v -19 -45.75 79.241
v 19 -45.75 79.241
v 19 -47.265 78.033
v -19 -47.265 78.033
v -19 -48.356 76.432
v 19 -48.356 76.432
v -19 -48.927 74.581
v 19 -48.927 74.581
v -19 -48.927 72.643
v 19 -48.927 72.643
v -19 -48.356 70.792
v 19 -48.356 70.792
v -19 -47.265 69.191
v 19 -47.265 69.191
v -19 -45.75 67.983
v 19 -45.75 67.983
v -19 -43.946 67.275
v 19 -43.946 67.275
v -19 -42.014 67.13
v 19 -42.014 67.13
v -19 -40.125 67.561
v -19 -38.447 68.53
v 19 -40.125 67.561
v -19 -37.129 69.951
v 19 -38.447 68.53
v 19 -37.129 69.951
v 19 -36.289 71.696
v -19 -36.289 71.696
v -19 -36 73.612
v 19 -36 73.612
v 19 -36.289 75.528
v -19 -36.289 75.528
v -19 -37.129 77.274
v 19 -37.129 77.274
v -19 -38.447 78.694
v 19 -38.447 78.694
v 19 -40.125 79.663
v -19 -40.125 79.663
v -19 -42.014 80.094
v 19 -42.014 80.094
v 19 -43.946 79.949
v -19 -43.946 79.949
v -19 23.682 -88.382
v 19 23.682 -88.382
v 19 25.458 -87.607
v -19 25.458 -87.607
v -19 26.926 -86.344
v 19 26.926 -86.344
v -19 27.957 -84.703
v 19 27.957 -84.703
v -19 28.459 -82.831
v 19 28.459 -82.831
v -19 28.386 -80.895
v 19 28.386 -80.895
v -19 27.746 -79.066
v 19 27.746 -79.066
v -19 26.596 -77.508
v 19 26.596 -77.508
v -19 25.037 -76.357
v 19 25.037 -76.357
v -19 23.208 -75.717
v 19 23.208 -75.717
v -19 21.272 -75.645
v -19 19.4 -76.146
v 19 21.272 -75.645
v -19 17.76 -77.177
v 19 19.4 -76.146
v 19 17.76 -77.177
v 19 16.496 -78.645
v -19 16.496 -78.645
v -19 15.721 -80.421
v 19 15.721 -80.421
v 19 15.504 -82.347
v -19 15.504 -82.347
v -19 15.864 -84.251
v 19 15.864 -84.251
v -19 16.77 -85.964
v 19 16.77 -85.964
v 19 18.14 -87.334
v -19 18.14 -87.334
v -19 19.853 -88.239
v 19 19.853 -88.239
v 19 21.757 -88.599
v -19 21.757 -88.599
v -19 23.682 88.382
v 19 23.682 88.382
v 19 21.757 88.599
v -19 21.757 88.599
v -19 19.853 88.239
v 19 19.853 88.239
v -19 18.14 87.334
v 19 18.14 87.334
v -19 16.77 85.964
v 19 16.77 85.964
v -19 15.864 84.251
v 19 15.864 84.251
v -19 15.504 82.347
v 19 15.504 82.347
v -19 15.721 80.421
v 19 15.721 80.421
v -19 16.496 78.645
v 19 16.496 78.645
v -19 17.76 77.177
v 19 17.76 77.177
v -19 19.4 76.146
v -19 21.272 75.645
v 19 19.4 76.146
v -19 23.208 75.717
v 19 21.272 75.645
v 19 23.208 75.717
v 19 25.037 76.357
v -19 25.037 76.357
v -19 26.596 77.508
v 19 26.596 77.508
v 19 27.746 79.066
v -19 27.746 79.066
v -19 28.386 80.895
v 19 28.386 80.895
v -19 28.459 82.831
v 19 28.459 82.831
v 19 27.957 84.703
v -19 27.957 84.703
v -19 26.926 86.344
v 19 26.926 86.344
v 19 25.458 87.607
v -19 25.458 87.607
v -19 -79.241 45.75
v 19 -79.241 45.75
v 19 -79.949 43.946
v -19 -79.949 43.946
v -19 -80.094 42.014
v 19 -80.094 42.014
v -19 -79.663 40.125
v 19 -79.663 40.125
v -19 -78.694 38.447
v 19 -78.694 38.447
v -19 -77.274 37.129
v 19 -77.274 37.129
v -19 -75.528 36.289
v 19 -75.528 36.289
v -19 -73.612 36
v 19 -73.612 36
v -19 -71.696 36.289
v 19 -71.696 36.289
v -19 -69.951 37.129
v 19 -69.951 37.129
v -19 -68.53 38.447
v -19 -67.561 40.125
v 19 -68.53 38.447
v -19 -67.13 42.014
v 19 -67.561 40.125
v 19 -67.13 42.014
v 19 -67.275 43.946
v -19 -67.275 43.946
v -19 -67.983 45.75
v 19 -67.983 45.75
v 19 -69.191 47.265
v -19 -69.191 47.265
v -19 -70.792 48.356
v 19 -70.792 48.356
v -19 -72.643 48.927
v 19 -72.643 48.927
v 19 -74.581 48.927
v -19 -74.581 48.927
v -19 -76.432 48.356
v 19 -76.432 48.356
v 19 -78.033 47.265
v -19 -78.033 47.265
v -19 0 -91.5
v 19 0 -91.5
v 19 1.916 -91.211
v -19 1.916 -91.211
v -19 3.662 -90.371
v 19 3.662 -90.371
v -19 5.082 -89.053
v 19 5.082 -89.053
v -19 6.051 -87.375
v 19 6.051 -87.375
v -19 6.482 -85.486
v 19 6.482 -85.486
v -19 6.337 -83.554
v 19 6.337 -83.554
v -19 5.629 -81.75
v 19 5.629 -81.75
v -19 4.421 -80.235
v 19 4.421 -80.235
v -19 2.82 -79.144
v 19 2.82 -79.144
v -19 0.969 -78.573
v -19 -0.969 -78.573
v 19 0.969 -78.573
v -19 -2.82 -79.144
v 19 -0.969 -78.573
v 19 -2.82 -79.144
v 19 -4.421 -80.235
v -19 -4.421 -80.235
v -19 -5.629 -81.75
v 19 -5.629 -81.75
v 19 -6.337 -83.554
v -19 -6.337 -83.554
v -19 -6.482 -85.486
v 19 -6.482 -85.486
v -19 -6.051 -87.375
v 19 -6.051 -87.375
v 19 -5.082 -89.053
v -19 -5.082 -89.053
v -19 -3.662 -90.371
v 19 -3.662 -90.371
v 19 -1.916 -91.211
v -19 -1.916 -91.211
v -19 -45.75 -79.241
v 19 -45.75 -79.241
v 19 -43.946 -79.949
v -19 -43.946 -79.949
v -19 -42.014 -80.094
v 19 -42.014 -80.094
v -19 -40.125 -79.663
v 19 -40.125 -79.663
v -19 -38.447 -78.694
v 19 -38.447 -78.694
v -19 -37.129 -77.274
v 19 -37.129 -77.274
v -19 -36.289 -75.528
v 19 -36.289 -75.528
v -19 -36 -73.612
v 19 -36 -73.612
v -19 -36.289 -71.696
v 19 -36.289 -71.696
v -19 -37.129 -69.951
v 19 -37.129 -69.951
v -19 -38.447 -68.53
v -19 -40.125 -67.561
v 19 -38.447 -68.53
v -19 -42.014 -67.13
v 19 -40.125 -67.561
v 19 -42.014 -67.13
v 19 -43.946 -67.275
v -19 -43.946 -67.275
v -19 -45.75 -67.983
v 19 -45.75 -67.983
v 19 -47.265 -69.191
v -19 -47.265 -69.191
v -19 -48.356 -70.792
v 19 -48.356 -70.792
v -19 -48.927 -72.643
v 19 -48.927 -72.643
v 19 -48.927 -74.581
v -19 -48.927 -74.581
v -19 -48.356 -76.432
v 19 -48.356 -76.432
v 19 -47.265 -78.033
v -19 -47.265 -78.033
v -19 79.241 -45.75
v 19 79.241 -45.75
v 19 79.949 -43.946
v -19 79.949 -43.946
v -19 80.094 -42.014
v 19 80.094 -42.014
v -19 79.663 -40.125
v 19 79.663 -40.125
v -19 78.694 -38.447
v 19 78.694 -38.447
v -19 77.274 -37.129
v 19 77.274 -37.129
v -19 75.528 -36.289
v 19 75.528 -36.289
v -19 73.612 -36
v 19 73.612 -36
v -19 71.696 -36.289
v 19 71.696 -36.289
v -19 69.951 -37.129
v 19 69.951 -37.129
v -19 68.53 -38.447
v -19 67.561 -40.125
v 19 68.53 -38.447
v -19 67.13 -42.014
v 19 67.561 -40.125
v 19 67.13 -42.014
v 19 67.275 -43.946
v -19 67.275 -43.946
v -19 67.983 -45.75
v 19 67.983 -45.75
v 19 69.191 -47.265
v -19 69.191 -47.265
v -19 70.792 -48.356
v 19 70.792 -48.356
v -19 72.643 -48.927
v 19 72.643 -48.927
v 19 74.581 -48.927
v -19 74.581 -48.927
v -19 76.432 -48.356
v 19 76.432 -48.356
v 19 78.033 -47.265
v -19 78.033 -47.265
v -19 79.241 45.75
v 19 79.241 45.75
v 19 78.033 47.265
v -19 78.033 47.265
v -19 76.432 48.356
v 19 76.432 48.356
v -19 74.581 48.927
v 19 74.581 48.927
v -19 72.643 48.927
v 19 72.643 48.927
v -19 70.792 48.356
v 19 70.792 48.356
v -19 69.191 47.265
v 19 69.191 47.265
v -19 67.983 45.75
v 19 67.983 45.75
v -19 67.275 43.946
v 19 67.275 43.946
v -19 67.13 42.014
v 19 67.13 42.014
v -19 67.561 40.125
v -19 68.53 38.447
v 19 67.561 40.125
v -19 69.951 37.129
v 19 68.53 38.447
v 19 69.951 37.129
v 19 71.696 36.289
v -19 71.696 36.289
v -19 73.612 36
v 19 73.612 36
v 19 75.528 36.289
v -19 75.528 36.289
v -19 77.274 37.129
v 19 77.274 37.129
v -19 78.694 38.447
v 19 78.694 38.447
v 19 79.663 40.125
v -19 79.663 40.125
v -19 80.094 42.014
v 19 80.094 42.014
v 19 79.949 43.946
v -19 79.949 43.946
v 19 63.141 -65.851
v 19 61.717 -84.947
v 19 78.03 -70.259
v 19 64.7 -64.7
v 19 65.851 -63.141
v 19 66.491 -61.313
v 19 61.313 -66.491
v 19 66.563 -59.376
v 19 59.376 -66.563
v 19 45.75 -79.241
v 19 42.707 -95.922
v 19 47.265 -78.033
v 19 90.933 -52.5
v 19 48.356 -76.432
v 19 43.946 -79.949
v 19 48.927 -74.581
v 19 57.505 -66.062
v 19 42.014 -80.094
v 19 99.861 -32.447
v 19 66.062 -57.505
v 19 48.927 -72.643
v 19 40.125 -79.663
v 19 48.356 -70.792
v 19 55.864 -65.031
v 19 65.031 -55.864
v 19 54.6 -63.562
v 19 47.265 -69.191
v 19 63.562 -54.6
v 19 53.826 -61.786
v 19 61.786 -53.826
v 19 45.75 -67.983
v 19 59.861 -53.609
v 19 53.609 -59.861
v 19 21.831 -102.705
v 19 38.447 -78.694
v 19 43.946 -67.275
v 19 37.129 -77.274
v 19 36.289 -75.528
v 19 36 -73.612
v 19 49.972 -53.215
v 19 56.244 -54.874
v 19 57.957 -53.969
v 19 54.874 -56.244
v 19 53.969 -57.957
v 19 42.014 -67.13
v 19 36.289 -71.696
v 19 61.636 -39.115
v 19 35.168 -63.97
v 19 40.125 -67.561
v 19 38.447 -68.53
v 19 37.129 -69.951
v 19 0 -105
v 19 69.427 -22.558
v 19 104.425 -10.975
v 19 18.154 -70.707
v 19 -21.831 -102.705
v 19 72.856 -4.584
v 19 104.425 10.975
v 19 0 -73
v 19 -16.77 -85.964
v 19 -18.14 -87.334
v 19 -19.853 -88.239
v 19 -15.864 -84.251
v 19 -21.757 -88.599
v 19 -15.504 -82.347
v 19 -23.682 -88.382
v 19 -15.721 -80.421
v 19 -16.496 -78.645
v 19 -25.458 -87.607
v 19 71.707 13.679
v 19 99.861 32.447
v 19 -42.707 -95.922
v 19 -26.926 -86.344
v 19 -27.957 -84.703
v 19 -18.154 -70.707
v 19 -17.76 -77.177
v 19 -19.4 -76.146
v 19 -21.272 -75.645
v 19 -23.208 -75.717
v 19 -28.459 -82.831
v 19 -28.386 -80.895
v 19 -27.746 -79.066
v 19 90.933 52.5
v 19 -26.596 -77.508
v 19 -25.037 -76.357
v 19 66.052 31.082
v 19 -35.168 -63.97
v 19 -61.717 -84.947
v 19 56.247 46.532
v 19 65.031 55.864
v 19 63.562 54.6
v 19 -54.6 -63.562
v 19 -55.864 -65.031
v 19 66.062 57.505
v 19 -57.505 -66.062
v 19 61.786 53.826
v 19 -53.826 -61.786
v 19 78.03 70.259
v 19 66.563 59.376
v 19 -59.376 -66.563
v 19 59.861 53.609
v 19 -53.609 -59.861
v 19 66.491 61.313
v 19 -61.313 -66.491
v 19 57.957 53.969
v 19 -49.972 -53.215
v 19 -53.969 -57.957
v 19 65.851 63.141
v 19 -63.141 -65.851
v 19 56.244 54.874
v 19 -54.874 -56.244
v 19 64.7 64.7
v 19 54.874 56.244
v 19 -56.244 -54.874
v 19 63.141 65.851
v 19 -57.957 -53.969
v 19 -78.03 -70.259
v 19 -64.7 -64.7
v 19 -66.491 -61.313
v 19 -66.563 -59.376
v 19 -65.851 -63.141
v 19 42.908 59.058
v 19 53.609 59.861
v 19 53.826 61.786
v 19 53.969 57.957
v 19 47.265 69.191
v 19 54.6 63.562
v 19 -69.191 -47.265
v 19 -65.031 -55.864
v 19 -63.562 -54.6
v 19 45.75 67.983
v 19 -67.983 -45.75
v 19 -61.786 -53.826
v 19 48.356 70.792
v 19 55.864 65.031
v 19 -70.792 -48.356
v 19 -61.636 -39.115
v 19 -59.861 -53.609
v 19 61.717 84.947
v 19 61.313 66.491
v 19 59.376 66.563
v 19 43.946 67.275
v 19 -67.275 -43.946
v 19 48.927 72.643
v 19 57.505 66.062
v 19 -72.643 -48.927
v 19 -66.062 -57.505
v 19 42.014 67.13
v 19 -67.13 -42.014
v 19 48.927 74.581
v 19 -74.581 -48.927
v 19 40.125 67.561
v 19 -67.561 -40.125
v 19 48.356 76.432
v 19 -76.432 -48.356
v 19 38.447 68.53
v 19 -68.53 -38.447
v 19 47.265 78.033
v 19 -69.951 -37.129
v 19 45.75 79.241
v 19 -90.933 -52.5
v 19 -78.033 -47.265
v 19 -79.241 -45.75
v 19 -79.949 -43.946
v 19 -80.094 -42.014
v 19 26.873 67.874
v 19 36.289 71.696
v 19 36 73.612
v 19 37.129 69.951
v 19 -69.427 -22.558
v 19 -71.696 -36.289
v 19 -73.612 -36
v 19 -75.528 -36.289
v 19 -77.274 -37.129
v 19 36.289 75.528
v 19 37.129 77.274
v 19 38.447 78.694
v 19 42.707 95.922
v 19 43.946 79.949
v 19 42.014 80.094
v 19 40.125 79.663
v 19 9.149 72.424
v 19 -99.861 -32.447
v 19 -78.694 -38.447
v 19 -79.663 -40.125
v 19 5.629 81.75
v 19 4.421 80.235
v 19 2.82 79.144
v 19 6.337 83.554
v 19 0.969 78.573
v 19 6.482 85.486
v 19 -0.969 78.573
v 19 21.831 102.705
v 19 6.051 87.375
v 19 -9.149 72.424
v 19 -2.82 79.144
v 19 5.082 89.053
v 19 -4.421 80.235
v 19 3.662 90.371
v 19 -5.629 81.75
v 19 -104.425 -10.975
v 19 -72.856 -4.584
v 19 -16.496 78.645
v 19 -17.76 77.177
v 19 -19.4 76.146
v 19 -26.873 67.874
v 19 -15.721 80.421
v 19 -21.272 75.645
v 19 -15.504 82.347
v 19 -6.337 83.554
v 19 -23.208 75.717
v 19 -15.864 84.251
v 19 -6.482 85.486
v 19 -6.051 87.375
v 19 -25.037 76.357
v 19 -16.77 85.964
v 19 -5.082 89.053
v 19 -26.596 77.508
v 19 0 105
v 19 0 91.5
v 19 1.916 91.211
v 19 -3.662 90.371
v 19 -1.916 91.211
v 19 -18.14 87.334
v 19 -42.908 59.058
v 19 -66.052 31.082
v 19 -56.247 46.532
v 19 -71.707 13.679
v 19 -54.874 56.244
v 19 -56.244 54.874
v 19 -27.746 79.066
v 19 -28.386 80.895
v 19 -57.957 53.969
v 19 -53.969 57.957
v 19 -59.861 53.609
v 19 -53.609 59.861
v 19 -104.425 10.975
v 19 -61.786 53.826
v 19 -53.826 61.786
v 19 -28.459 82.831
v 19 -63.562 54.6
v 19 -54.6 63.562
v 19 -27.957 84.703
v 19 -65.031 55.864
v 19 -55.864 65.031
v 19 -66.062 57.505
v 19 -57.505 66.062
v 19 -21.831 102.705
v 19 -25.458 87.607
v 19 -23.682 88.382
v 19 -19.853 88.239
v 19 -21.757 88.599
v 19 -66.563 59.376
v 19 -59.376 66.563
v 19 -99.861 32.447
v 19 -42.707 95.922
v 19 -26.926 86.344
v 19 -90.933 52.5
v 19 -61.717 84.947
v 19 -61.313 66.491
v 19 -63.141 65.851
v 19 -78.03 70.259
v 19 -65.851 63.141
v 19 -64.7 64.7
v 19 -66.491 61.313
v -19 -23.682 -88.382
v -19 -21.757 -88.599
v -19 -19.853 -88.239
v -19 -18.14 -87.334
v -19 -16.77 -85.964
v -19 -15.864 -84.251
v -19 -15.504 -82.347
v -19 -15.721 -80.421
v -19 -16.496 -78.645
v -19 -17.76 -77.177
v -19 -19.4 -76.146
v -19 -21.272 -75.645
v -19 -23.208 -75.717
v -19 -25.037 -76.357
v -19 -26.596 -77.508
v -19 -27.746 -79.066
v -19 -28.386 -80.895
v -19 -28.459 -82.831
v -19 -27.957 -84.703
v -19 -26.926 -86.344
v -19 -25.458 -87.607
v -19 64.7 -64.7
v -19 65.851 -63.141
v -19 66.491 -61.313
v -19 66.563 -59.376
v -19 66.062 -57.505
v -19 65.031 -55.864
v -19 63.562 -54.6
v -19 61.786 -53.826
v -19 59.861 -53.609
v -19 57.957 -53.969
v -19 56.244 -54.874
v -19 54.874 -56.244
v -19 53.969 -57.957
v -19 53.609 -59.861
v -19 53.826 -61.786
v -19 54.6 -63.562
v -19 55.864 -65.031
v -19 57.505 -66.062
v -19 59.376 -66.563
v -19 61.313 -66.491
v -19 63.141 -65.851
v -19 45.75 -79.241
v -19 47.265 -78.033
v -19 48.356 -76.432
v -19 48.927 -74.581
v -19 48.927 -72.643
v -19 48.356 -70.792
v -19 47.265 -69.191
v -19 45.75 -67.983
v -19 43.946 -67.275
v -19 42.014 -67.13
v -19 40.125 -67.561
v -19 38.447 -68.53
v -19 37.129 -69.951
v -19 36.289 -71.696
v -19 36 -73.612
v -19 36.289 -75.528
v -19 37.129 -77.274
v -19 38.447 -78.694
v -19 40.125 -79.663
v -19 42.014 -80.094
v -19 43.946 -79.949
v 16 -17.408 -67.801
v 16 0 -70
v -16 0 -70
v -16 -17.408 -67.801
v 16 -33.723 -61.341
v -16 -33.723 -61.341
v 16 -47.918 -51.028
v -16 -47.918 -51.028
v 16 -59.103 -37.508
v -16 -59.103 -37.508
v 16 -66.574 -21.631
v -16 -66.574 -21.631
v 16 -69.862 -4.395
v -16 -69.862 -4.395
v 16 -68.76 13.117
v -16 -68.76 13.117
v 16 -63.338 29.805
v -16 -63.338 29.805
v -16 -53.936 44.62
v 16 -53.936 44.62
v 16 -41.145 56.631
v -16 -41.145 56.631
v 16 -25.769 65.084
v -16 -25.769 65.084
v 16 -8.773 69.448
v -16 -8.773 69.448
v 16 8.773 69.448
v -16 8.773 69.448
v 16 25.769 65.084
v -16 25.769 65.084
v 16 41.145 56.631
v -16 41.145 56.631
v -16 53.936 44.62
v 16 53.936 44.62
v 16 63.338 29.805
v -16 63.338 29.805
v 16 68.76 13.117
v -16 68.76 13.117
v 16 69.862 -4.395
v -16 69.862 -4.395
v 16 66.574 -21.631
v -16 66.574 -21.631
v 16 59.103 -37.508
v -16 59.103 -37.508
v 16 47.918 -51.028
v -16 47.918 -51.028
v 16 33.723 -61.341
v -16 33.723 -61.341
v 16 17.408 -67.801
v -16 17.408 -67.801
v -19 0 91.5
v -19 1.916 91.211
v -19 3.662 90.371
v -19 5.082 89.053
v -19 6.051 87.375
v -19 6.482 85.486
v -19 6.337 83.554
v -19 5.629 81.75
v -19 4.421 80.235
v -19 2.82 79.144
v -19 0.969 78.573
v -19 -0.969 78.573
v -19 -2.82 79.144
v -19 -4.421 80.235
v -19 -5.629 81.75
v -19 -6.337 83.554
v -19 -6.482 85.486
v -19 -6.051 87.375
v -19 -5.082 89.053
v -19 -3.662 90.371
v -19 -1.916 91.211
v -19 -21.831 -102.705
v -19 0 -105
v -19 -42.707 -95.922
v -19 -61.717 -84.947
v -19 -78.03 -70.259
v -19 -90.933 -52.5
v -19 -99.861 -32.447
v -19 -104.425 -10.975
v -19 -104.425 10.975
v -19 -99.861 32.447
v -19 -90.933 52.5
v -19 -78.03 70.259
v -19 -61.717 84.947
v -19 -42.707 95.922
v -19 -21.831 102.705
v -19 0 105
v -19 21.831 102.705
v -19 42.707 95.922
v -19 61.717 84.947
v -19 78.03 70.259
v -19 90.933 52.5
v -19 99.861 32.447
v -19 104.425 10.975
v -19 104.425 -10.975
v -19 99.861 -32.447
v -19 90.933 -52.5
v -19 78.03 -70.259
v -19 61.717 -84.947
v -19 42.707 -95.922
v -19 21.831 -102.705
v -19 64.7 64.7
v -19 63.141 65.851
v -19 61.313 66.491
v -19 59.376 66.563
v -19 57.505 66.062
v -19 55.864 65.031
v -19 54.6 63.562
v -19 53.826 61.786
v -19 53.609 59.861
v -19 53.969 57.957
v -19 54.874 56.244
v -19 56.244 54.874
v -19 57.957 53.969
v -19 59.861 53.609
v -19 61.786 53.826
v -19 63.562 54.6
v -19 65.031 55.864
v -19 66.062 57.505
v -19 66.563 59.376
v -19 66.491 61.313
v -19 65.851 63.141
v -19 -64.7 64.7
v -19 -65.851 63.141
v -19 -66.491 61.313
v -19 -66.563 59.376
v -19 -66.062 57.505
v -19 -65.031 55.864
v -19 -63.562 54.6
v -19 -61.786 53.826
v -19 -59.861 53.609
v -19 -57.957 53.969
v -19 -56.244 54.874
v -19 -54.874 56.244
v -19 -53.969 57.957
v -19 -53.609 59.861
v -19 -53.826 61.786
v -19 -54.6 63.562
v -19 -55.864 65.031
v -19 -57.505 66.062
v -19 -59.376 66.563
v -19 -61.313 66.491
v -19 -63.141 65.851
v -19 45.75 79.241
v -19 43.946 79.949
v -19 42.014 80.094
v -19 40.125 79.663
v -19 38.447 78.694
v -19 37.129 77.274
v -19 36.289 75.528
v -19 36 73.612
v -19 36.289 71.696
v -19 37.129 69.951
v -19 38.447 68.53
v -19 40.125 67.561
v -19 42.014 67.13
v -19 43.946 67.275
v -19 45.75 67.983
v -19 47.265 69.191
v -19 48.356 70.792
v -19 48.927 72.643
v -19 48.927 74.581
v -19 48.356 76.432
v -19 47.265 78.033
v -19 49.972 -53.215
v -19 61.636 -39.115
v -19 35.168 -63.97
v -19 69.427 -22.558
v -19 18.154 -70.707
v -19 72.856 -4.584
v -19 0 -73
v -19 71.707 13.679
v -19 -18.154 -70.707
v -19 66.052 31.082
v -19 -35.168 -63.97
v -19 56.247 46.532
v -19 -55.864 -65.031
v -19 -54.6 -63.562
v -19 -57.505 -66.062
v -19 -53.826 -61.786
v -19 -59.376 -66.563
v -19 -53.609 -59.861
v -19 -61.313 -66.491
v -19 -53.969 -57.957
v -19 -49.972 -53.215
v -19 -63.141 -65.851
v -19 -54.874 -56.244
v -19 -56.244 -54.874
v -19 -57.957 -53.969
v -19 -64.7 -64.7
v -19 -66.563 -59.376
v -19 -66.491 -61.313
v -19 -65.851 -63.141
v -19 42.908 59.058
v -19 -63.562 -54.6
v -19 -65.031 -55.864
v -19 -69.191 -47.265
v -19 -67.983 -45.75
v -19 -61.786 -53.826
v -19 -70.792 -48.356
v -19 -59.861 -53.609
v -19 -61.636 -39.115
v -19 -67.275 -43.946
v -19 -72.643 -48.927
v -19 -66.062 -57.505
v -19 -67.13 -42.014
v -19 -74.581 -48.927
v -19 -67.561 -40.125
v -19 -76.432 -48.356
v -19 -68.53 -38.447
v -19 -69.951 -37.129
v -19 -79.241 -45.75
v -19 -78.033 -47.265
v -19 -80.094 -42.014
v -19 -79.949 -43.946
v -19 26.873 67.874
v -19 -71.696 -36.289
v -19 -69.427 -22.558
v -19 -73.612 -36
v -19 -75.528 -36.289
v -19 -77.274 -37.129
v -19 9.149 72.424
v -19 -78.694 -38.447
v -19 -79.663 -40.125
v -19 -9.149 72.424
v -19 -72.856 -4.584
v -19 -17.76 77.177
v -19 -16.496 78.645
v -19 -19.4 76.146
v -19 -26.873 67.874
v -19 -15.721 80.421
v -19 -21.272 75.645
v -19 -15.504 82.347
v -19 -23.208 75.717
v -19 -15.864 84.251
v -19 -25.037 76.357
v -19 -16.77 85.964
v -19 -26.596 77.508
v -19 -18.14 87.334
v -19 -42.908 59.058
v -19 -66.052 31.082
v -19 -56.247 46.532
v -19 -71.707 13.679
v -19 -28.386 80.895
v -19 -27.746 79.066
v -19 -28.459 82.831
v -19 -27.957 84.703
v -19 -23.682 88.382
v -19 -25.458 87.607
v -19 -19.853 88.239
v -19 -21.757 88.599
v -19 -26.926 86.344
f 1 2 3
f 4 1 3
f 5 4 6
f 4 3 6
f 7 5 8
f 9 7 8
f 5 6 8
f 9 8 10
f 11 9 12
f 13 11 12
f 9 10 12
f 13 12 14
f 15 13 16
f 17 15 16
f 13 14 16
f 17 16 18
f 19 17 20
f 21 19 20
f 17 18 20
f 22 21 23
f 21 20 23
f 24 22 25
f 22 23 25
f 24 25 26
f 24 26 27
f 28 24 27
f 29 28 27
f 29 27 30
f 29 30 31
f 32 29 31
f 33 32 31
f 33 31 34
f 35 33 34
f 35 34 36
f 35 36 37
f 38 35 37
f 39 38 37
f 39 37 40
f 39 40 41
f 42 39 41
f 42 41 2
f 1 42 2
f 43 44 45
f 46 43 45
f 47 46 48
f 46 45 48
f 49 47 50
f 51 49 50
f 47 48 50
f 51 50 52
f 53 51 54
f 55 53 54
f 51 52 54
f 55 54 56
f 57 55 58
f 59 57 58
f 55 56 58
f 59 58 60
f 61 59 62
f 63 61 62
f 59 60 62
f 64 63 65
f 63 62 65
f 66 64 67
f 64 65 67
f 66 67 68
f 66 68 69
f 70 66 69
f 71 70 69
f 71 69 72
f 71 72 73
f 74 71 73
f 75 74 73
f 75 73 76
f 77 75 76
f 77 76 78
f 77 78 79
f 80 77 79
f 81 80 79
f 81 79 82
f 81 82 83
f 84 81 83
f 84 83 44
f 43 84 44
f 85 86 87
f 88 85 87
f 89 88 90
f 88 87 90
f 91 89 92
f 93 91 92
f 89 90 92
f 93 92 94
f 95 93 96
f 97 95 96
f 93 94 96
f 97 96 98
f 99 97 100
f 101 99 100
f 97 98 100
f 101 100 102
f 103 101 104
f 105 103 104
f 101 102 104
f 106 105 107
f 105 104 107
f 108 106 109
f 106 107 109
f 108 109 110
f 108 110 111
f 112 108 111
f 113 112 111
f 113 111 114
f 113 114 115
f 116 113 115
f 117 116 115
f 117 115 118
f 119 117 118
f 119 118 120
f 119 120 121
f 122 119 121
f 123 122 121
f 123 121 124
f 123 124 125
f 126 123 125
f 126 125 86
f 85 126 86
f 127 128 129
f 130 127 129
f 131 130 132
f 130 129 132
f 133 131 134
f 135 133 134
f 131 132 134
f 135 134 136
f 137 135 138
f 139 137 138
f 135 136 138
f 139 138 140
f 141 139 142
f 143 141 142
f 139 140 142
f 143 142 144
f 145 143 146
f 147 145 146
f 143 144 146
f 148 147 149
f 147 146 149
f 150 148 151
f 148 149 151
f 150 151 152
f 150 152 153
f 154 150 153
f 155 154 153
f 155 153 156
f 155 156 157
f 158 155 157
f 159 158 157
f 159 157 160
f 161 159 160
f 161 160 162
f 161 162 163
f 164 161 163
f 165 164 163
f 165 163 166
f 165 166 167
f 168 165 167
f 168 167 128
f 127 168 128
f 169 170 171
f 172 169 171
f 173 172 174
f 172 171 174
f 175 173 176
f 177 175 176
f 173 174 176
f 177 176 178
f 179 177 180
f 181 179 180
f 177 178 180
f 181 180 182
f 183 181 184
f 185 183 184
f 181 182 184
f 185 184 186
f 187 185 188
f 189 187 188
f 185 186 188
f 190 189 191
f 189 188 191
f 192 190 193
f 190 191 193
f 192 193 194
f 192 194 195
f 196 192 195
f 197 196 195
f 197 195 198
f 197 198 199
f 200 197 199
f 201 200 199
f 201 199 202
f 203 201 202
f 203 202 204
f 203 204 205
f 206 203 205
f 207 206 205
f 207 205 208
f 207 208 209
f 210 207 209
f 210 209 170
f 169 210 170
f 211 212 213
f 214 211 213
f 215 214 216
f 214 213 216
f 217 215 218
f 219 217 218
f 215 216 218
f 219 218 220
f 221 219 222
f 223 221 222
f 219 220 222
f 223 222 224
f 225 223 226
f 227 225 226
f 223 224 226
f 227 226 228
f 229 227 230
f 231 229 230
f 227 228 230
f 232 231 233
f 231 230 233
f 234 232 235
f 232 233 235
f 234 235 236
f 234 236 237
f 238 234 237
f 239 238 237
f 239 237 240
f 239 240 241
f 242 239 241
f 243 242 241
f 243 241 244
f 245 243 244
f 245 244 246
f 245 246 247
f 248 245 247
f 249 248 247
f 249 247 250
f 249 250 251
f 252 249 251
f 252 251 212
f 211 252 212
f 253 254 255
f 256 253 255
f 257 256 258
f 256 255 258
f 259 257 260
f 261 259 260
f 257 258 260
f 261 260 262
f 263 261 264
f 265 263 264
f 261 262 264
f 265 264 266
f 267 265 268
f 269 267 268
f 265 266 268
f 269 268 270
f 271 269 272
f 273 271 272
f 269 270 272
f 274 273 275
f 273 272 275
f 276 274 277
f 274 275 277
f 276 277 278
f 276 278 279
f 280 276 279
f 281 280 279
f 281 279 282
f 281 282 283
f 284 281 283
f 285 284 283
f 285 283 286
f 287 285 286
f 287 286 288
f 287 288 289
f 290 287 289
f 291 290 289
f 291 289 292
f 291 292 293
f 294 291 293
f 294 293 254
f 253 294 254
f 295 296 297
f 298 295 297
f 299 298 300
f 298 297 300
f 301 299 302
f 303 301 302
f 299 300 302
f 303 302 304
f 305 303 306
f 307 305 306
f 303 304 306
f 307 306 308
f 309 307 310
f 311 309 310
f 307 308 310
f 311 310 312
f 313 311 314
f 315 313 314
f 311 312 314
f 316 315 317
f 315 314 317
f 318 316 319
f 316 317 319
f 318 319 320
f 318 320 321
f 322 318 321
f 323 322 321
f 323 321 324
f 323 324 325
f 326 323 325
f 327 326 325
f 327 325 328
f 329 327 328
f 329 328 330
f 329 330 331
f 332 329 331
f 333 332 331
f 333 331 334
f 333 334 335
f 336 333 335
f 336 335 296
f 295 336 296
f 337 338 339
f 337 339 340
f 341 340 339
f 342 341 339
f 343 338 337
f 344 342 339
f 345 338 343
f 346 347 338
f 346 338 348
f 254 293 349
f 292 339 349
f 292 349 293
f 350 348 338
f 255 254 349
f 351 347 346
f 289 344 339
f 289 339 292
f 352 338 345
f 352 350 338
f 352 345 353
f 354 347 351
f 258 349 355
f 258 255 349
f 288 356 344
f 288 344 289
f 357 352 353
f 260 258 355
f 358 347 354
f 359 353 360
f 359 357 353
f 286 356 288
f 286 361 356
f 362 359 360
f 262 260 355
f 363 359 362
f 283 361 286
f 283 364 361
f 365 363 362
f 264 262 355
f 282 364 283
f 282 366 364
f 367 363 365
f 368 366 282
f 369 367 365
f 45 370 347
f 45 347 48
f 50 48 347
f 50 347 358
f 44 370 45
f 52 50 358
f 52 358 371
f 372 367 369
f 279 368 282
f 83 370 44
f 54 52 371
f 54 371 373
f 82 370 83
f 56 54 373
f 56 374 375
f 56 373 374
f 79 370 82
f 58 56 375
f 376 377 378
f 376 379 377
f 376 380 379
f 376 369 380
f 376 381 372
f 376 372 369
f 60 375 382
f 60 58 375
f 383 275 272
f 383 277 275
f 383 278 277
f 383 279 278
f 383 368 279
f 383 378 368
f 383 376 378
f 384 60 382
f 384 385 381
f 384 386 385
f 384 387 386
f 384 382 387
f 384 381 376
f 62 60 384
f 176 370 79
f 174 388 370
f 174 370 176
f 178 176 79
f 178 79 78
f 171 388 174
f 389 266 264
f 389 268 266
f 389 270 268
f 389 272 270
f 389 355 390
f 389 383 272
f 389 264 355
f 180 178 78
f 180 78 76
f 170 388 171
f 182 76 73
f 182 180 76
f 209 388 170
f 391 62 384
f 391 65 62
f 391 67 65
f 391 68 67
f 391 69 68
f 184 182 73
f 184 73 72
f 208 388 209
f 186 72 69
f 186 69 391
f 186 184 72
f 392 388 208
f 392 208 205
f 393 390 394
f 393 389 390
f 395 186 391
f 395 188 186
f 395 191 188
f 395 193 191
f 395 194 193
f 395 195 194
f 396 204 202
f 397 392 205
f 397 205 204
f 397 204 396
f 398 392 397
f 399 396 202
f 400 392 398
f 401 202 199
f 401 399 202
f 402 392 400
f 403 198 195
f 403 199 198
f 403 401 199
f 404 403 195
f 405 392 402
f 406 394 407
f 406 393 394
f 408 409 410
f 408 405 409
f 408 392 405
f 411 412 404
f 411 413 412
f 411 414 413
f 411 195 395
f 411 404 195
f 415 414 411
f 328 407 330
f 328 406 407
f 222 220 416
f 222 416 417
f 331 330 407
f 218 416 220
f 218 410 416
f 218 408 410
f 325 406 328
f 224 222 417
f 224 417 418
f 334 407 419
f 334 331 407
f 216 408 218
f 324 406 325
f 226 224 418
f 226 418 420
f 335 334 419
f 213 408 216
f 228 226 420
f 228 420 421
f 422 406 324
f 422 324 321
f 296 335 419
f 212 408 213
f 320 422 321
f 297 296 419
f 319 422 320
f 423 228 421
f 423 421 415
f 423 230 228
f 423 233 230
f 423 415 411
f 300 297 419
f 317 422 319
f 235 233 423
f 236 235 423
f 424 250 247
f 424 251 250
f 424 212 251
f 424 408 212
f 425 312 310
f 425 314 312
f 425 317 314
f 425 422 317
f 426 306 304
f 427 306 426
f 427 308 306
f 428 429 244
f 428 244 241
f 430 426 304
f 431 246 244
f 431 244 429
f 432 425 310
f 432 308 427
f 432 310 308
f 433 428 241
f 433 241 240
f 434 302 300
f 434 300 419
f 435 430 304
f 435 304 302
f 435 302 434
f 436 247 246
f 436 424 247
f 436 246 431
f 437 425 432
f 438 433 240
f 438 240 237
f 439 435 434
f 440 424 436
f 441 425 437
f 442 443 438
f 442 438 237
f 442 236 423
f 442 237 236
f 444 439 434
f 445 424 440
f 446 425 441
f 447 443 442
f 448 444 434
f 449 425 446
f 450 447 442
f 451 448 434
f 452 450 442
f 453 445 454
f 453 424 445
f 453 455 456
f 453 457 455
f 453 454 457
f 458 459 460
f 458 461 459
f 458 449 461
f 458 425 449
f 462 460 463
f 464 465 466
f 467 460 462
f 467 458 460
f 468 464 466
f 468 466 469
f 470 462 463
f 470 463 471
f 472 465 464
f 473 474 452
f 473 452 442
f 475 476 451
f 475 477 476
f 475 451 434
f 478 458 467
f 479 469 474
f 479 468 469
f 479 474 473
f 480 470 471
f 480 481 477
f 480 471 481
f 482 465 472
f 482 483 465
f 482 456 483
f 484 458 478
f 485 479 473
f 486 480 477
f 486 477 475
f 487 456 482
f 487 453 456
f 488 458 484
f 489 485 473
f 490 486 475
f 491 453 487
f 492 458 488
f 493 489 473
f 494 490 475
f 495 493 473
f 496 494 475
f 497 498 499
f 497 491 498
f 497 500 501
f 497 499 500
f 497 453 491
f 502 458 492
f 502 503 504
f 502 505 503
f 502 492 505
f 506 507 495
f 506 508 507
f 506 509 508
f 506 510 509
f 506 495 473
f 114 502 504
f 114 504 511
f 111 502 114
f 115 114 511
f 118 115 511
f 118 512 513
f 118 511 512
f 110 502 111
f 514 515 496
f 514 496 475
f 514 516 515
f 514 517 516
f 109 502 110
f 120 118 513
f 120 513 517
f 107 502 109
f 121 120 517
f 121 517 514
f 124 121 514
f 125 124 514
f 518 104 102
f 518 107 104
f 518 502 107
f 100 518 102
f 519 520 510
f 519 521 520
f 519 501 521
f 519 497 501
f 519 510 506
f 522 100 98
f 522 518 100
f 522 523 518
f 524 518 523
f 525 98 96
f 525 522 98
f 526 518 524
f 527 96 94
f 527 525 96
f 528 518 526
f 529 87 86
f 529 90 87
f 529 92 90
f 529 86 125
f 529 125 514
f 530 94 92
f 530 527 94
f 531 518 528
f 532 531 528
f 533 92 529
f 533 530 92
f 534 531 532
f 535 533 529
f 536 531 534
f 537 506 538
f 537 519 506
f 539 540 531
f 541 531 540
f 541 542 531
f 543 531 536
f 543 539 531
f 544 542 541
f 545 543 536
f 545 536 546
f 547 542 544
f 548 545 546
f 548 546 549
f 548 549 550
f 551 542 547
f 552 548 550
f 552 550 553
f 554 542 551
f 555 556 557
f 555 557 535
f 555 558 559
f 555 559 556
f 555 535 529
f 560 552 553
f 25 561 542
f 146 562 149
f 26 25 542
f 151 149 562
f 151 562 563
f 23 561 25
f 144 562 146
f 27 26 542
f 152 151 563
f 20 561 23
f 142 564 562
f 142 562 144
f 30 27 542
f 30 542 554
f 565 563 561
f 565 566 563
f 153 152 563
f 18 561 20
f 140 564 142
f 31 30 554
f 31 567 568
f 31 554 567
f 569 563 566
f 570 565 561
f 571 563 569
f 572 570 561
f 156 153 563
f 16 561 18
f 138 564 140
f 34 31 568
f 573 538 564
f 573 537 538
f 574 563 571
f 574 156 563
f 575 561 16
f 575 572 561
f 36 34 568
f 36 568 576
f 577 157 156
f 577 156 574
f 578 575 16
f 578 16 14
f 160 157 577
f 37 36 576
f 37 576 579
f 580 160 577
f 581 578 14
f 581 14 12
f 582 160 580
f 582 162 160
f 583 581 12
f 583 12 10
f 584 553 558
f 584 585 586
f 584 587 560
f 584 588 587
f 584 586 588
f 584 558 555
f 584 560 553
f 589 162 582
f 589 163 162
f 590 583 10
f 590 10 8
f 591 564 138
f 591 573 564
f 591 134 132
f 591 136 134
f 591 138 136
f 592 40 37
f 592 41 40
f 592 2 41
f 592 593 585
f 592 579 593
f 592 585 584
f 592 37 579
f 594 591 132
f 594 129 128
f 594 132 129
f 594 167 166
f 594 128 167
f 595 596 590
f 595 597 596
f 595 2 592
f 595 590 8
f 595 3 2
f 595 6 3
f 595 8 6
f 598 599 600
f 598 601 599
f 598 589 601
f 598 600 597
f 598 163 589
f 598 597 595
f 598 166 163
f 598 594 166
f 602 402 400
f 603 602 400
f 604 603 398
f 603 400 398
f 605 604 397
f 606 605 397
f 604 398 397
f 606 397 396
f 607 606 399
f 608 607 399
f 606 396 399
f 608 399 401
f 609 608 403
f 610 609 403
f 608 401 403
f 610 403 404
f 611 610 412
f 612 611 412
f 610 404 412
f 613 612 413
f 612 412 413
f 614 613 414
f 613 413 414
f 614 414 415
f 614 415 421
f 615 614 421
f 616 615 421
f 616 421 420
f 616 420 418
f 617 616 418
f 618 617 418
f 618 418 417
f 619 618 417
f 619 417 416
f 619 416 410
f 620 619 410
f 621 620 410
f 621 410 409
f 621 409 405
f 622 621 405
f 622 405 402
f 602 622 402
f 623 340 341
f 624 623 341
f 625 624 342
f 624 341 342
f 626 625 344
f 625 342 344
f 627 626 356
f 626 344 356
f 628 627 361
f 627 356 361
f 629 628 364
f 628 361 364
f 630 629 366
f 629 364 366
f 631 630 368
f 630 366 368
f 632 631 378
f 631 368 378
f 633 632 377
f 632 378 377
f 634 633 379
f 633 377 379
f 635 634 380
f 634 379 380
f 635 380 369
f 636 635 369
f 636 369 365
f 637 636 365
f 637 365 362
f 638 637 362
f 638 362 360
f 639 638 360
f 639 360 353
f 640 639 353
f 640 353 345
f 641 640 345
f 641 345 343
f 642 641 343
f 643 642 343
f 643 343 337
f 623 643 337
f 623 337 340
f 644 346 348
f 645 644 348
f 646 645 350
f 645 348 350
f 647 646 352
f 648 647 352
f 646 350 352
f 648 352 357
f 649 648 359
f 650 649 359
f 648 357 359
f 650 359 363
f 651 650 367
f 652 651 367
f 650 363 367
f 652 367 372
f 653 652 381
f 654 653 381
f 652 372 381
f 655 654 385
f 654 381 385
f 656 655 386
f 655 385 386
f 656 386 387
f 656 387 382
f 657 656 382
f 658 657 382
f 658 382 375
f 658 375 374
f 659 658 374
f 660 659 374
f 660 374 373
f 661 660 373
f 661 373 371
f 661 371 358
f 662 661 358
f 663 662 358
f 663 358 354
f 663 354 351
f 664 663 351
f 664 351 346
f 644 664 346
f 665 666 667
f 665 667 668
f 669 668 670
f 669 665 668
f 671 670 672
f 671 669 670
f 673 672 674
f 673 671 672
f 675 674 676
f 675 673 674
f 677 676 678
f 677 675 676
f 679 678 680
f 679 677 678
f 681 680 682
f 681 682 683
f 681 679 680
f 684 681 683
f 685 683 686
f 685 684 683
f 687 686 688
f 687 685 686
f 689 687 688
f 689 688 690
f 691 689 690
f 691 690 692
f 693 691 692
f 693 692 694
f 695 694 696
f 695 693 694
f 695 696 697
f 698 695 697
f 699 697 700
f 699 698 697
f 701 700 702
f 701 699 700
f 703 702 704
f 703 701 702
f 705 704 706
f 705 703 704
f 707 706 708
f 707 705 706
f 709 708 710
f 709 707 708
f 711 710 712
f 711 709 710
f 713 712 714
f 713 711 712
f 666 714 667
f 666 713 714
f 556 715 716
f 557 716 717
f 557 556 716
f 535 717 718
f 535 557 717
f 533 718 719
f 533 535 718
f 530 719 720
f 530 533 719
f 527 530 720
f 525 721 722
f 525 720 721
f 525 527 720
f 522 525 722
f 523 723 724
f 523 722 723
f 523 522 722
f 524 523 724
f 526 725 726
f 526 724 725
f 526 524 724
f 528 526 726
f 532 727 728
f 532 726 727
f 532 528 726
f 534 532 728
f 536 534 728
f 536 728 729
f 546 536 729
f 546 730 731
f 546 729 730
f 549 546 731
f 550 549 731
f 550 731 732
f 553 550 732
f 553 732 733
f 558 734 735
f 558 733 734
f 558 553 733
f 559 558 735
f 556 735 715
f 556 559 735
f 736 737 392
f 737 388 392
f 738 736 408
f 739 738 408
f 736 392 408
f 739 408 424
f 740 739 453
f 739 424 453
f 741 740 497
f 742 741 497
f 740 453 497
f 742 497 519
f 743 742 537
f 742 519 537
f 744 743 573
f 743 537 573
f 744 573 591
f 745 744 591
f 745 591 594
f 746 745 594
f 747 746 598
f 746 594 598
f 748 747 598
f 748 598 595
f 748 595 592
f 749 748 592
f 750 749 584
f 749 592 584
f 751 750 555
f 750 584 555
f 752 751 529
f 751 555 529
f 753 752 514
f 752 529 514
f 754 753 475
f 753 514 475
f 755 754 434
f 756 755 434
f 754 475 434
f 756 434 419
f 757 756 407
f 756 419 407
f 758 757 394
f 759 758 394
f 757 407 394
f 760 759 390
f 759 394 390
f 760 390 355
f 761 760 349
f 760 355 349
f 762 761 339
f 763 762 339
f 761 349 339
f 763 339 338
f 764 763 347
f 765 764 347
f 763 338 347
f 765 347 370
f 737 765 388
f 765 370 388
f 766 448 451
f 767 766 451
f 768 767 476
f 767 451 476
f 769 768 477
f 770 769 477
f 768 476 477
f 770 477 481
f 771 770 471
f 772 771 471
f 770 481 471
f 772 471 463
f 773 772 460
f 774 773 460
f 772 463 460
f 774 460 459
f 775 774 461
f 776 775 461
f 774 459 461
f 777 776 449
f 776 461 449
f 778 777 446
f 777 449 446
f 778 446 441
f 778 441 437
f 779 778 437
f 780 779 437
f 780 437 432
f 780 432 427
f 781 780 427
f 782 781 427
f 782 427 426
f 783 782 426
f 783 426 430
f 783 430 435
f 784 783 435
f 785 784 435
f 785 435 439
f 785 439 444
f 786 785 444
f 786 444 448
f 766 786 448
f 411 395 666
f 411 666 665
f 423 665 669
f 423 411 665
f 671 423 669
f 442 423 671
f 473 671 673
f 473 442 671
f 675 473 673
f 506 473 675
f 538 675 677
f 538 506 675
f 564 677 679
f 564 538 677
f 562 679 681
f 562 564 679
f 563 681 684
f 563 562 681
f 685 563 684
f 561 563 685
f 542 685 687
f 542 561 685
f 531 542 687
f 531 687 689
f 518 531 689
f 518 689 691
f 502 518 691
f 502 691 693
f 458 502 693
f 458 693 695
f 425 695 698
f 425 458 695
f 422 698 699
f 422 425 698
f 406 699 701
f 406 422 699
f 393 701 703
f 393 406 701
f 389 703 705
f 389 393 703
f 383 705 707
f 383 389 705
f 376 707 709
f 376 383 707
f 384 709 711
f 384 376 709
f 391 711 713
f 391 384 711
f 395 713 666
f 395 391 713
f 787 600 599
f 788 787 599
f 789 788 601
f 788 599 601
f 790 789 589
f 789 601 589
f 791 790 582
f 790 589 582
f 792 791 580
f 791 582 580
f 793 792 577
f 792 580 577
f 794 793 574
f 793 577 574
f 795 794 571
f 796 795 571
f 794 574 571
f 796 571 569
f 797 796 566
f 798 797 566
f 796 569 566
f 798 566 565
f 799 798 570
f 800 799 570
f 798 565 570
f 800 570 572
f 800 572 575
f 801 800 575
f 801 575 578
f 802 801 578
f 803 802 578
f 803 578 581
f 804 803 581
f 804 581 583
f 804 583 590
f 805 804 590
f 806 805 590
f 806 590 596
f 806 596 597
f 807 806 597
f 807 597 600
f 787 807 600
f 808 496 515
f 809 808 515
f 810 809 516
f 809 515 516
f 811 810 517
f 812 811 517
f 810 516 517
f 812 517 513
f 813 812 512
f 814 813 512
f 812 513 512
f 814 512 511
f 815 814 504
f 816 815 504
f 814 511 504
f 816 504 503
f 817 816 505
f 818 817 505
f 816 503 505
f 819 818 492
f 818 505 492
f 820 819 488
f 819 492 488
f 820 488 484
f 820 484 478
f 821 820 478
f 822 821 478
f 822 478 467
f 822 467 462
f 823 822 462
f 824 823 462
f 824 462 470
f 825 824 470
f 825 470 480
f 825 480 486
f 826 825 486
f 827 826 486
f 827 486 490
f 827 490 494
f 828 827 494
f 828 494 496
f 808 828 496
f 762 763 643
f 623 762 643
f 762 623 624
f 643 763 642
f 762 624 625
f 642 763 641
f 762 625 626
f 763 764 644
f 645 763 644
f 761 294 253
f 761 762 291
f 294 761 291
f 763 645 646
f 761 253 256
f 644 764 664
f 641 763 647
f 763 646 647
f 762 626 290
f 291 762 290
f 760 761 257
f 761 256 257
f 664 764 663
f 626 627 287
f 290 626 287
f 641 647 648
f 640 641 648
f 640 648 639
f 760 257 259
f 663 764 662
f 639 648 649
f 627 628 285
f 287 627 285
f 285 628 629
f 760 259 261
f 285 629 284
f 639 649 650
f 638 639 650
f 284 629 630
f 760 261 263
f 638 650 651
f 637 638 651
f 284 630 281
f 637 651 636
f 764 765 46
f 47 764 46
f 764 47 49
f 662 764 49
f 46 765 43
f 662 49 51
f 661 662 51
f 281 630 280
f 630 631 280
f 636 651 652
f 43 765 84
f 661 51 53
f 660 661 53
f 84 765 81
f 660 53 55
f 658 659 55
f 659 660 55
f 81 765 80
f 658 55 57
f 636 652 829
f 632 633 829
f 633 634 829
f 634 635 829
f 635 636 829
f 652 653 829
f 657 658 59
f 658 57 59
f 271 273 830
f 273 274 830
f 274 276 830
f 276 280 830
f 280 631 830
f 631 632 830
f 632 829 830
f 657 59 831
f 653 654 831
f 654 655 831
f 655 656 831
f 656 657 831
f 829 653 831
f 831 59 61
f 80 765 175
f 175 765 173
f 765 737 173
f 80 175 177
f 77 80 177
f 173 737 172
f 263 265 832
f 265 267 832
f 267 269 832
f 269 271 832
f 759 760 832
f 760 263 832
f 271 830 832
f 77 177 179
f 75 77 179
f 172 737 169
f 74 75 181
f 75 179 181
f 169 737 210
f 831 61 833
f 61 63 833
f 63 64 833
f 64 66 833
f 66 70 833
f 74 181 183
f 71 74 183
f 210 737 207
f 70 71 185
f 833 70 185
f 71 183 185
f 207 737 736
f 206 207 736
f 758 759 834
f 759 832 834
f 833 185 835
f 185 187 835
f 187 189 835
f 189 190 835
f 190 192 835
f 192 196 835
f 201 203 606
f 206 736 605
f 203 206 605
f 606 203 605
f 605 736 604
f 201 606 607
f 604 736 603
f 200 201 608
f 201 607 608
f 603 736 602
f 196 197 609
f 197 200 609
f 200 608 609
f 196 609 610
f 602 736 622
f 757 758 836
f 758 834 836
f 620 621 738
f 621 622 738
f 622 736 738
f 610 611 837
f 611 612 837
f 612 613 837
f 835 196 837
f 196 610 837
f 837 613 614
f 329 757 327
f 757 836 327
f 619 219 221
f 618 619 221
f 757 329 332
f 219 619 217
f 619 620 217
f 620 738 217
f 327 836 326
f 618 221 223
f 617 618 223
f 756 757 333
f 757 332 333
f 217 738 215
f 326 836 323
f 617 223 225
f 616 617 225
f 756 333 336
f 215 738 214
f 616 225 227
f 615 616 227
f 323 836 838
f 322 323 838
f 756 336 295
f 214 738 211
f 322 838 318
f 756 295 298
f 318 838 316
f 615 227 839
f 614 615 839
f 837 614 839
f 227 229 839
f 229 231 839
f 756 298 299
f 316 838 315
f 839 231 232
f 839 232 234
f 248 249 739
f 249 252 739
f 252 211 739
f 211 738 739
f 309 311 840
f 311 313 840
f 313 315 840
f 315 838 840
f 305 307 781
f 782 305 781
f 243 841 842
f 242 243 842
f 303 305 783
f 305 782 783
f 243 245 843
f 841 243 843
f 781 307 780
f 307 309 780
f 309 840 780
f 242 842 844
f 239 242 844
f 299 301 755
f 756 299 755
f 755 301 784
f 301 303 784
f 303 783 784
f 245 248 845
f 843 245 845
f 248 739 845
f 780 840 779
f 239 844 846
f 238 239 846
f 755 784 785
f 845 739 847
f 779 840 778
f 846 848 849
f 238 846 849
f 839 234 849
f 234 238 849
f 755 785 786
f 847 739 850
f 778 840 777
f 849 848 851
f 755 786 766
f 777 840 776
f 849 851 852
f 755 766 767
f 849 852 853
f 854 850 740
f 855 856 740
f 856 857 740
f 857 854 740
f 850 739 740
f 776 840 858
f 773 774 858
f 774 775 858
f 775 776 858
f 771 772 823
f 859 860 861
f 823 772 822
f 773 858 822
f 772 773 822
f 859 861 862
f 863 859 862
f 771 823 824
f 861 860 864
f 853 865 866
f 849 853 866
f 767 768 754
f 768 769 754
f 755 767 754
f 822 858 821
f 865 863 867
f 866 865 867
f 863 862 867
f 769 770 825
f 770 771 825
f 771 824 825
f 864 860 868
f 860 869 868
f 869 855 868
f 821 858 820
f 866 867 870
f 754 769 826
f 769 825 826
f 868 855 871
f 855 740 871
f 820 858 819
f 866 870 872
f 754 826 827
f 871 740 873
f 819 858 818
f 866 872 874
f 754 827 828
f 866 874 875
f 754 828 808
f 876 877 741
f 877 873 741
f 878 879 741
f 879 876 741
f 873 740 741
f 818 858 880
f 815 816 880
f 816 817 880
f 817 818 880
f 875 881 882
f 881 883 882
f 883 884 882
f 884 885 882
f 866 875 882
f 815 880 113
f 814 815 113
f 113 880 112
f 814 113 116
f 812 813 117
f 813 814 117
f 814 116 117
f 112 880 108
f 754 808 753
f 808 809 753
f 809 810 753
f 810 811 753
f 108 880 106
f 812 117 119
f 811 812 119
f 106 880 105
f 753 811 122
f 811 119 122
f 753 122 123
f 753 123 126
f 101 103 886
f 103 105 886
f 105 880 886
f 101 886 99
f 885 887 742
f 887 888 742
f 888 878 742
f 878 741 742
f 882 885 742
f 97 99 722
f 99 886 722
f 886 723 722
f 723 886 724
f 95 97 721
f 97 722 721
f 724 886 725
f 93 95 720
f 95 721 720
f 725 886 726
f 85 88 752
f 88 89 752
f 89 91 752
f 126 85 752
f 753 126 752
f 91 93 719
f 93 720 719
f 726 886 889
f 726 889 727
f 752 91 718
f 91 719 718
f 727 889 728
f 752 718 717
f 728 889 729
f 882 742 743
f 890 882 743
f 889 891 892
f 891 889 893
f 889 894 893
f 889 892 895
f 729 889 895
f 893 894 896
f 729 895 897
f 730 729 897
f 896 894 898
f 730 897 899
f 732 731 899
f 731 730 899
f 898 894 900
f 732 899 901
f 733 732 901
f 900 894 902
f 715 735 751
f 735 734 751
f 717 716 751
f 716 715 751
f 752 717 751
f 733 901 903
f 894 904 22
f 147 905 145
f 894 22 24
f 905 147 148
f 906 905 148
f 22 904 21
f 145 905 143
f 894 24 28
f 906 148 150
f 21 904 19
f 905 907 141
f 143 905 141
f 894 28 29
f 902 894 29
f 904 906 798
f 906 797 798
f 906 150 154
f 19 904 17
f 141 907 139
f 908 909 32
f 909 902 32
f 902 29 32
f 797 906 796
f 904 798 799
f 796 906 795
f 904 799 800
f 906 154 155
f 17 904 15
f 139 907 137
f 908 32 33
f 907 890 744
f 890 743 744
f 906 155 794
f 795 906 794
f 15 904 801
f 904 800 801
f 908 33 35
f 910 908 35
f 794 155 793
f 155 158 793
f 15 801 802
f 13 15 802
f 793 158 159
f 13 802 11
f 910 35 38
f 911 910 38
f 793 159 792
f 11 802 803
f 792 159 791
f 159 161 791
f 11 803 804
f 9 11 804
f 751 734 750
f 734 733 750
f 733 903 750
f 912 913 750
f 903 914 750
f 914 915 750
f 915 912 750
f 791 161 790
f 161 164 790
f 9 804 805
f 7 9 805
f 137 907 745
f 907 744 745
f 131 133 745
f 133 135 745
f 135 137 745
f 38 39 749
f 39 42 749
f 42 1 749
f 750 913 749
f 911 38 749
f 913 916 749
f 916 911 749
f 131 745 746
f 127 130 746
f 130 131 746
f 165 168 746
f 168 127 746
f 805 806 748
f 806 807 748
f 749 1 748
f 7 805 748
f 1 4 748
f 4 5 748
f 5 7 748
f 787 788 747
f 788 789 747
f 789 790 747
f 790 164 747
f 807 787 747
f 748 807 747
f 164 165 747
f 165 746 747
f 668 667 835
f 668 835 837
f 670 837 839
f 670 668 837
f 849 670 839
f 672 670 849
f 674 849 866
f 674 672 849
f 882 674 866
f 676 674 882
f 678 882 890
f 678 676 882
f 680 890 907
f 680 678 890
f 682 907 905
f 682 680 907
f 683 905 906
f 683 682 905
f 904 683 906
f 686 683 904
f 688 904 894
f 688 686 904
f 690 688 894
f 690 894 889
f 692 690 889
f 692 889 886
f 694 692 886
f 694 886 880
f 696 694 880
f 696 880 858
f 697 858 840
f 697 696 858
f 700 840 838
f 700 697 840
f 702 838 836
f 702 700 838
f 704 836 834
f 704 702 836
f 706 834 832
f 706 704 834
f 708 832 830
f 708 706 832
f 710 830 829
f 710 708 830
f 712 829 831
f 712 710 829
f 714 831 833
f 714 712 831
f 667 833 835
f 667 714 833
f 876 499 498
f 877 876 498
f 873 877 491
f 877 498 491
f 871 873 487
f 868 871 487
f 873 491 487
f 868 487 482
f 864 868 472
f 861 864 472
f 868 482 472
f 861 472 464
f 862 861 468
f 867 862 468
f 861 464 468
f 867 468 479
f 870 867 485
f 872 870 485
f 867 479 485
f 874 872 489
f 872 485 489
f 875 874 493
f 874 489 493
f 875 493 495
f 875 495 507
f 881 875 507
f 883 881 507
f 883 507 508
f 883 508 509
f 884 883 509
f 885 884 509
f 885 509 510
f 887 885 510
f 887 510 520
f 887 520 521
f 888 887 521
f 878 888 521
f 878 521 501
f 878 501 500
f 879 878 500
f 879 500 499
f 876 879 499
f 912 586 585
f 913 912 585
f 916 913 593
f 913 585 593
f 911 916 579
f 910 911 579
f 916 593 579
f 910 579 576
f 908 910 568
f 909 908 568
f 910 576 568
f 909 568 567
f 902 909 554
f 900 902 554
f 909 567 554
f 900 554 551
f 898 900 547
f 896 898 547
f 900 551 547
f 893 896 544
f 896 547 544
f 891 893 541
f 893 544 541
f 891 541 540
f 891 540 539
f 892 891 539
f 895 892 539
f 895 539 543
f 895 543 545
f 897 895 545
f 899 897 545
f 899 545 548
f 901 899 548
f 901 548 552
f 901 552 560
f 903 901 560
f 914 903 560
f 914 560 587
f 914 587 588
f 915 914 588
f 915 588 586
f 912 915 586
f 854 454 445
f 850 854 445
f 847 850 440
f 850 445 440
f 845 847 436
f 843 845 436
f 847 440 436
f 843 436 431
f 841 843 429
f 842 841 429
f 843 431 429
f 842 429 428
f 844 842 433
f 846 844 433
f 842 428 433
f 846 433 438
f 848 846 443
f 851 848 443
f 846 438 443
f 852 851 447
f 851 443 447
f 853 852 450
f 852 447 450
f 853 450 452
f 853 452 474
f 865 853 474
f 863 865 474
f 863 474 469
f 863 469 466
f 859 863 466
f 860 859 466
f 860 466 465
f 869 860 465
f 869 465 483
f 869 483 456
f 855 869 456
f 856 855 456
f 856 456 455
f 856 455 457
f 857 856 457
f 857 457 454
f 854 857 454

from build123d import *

# Parameters (mm, degrees)
SKETCH1_W                       = 38
SKETCH1_H                       = 35
SKETCH2_R                       = 6.5
CUT_EXTRUDE1_DEPTH              = 154.277526076
CIRPATTERN1_COUNT               = 5
CIRPATTERN1_ANGLE               = 60
CIRPATTERN1_THE_OTHER_WAY_COUNT = 5
CIRPATTERN1_THE_OTHER_WAY_ANGLE = 60
MIRROR1_COPY_1_SKETCH_R         = 6.5
MIRROR1_COPY_1_DEPTH            = 154.277526076
MIRROR1_COPY_2_SKETCH_R         = 6.5
MIRROR1_COPY_2_DEPTH            = 154.277526076
MIRROR1_COPY_3_SKETCH_R         = 6.5
MIRROR1_COPY_3_DEPTH            = 154.277526076
MIRROR1_COPY_4_SKETCH_R         = 6.5
MIRROR1_COPY_4_DEPTH            = 154.277526076
MIRROR1_COPY_5_SKETCH_R         = 6.5
MIRROR1_COPY_5_DEPTH            = 154.277526076
MIRROR1_COPY_6_SKETCH_R         = 6.5
MIRROR1_COPY_6_DEPTH            = 154.277526076
MIRROR1_COPY_7_SKETCH_R         = 6.5
MIRROR1_COPY_7_DEPTH            = 154.277526076
MIRROR1_COPY_8_SKETCH_R         = 6.5
MIRROR1_COPY_8_DEPTH            = 154.277526076
MIRROR1_COPY_9_SKETCH_R         = 6.5
MIRROR1_COPY_9_DEPTH            = 154.277526076
CHAMFER1_SIZE                   = 3


with BuildPart() as part:
    # Sketch1 → Revolve1 (revolve)
    with BuildSketch(Plane.XY):
        with Locations((0, 87.5)):
            Rectangle(SKETCH1_W, SKETCH1_H)
    revolve(axis=Axis((0, 0, 0), (-1, 0, 0)))

    # Sketch2 → Cut-Extrude1 (cut, through all)
    with BuildSketch(Plane(origin=(19, 0, 0), x_dir=(0, 0, -1), z_dir=(1, 0, 0))):
        with Locations((85, 0)):
            Circle(SKETCH2_R)
    cut_extrude1 = extrude(amount=-CUT_EXTRUDE1_DEPTH, mode=Mode.SUBTRACT)

    # CirPattern1: Cut-Extrude1 ×5 about axis
    cirpattern1_axis = Axis((-19, 0, 0), (1, 0, 0))
    for i in range(1, CIRPATTERN1_COUNT):
        add(cut_extrude1.rotate(cirpattern1_axis, i * CIRPATTERN1_ANGLE / (CIRPATTERN1_COUNT - 1)), mode=Mode.SUBTRACT)

    # CirPattern1 the other way: Cut-Extrude1 ×5 about axis
    cirpattern1_the_other_way_axis = Axis((-19, 0, 0), (-1, 0, 0))
    for i in range(1, CIRPATTERN1_THE_OTHER_WAY_COUNT):
        add(cut_extrude1.rotate(cirpattern1_the_other_way_axis, i * CIRPATTERN1_THE_OTHER_WAY_ANGLE / (CIRPATTERN1_THE_OTHER_WAY_COUNT - 1)), mode=Mode.SUBTRACT)

    # Mirror1 copy 1 sketch → Mirror1 copy 1 (cut, through all)
    with BuildSketch(Plane(origin=(19, 0, 0), x_dir=(0, 0.2588190451025214, 0.9659258262890681), z_dir=(1, 0, 0))):
        with Locations((85, 0)):
            Circle(MIRROR1_COPY_1_SKETCH_R)
    extrude(amount=-MIRROR1_COPY_1_DEPTH, mode=Mode.SUBTRACT)

    # Mirror1 copy 2 sketch → Mirror1 copy 2 (cut, through all)
    with BuildSketch(Plane(origin=(19, 0, 0), x_dir=(0, 0.5000000000000011, 0.866025403784438), z_dir=(1, 0, 0))):
        with Locations((85, 0)):
            Circle(MIRROR1_COPY_2_SKETCH_R)
    extrude(amount=-MIRROR1_COPY_2_DEPTH, mode=Mode.SUBTRACT)

    # Mirror1 copy 3 sketch → Mirror1 copy 3 (cut, through all)
    with BuildSketch(Plane(origin=(19, 0, 0), x_dir=(0, 0.7071067811865488, 0.7071067811865462), z_dir=(1, 0, 0))):
        with Locations((85, 0)):
            Circle(MIRROR1_COPY_3_SKETCH_R)
    extrude(amount=-MIRROR1_COPY_3_DEPTH, mode=Mode.SUBTRACT)

    # Mirror1 copy 4 sketch → Mirror1 copy 4 (cut, through all)
    with BuildSketch(Plane(origin=(19, 0, 0), x_dir=(0, 0.8660254037844399, 0.4999999999999978), z_dir=(1, 0, 0))):
        with Locations((85, 0)):
            Circle(MIRROR1_COPY_4_SKETCH_R)
    extrude(amount=-MIRROR1_COPY_4_DEPTH, mode=Mode.SUBTRACT)

    # Mirror1 copy 5 sketch → Mirror1 copy 5 (cut, through all)
    with BuildSketch(Plane(origin=(19, 0, 0), x_dir=(0, -0.2588190451025214, 0.9659258262890681), z_dir=(1, 0, 0))):
        with Locations((85, 0)):
            Circle(MIRROR1_COPY_5_SKETCH_R)
    extrude(amount=-MIRROR1_COPY_5_DEPTH, mode=Mode.SUBTRACT)

    # Mirror1 copy 6 sketch → Mirror1 copy 6 (cut, through all)
    with BuildSketch(Plane(origin=(19, 0, 0), x_dir=(0, -0.5000000000000011, 0.866025403784438), z_dir=(1, 0, 0))):
        with Locations((85, 0)):
            Circle(MIRROR1_COPY_6_SKETCH_R)
    extrude(amount=-MIRROR1_COPY_6_DEPTH, mode=Mode.SUBTRACT)

    # Mirror1 copy 7 sketch → Mirror1 copy 7 (cut, through all)
    with BuildSketch(Plane(origin=(19, 0, 0), x_dir=(0, -0.7071067811865488, 0.7071067811865462), z_dir=(1, 0, 0))):
        with Locations((85, 0)):
            Circle(MIRROR1_COPY_7_SKETCH_R)
    extrude(amount=-MIRROR1_COPY_7_DEPTH, mode=Mode.SUBTRACT)

    # Mirror1 copy 8 sketch → Mirror1 copy 8 (cut, through all)
    with BuildSketch(Plane(origin=(19, 0, 0), x_dir=(0, -0.8660254037844399, 0.4999999999999978), z_dir=(1, 0, 0))):
        with Locations((85, 0)):
            Circle(MIRROR1_COPY_8_SKETCH_R)
    extrude(amount=-MIRROR1_COPY_8_DEPTH, mode=Mode.SUBTRACT)

    # Mirror1 copy 9 sketch → Mirror1 copy 9 (cut, through all)
    with BuildSketch(Plane(origin=(19, 0, 0), x_dir=(0, 0, 1), z_dir=(1, 0, 0))):
        with Locations((85, 0)):
            Circle(MIRROR1_COPY_9_SKETCH_R)
    extrude(amount=-MIRROR1_COPY_9_DEPTH, mode=Mode.SUBTRACT)

    # Chamfer1
    chamfer1_edges = [part.edges().sort_by_distance(p)[0] for p in [
        (-19, -70, 0),
        (19, -70, 0),
    ]]
    chamfer(chamfer1_edges, length=CHAMFER1_SIZE)


solid = part.part
